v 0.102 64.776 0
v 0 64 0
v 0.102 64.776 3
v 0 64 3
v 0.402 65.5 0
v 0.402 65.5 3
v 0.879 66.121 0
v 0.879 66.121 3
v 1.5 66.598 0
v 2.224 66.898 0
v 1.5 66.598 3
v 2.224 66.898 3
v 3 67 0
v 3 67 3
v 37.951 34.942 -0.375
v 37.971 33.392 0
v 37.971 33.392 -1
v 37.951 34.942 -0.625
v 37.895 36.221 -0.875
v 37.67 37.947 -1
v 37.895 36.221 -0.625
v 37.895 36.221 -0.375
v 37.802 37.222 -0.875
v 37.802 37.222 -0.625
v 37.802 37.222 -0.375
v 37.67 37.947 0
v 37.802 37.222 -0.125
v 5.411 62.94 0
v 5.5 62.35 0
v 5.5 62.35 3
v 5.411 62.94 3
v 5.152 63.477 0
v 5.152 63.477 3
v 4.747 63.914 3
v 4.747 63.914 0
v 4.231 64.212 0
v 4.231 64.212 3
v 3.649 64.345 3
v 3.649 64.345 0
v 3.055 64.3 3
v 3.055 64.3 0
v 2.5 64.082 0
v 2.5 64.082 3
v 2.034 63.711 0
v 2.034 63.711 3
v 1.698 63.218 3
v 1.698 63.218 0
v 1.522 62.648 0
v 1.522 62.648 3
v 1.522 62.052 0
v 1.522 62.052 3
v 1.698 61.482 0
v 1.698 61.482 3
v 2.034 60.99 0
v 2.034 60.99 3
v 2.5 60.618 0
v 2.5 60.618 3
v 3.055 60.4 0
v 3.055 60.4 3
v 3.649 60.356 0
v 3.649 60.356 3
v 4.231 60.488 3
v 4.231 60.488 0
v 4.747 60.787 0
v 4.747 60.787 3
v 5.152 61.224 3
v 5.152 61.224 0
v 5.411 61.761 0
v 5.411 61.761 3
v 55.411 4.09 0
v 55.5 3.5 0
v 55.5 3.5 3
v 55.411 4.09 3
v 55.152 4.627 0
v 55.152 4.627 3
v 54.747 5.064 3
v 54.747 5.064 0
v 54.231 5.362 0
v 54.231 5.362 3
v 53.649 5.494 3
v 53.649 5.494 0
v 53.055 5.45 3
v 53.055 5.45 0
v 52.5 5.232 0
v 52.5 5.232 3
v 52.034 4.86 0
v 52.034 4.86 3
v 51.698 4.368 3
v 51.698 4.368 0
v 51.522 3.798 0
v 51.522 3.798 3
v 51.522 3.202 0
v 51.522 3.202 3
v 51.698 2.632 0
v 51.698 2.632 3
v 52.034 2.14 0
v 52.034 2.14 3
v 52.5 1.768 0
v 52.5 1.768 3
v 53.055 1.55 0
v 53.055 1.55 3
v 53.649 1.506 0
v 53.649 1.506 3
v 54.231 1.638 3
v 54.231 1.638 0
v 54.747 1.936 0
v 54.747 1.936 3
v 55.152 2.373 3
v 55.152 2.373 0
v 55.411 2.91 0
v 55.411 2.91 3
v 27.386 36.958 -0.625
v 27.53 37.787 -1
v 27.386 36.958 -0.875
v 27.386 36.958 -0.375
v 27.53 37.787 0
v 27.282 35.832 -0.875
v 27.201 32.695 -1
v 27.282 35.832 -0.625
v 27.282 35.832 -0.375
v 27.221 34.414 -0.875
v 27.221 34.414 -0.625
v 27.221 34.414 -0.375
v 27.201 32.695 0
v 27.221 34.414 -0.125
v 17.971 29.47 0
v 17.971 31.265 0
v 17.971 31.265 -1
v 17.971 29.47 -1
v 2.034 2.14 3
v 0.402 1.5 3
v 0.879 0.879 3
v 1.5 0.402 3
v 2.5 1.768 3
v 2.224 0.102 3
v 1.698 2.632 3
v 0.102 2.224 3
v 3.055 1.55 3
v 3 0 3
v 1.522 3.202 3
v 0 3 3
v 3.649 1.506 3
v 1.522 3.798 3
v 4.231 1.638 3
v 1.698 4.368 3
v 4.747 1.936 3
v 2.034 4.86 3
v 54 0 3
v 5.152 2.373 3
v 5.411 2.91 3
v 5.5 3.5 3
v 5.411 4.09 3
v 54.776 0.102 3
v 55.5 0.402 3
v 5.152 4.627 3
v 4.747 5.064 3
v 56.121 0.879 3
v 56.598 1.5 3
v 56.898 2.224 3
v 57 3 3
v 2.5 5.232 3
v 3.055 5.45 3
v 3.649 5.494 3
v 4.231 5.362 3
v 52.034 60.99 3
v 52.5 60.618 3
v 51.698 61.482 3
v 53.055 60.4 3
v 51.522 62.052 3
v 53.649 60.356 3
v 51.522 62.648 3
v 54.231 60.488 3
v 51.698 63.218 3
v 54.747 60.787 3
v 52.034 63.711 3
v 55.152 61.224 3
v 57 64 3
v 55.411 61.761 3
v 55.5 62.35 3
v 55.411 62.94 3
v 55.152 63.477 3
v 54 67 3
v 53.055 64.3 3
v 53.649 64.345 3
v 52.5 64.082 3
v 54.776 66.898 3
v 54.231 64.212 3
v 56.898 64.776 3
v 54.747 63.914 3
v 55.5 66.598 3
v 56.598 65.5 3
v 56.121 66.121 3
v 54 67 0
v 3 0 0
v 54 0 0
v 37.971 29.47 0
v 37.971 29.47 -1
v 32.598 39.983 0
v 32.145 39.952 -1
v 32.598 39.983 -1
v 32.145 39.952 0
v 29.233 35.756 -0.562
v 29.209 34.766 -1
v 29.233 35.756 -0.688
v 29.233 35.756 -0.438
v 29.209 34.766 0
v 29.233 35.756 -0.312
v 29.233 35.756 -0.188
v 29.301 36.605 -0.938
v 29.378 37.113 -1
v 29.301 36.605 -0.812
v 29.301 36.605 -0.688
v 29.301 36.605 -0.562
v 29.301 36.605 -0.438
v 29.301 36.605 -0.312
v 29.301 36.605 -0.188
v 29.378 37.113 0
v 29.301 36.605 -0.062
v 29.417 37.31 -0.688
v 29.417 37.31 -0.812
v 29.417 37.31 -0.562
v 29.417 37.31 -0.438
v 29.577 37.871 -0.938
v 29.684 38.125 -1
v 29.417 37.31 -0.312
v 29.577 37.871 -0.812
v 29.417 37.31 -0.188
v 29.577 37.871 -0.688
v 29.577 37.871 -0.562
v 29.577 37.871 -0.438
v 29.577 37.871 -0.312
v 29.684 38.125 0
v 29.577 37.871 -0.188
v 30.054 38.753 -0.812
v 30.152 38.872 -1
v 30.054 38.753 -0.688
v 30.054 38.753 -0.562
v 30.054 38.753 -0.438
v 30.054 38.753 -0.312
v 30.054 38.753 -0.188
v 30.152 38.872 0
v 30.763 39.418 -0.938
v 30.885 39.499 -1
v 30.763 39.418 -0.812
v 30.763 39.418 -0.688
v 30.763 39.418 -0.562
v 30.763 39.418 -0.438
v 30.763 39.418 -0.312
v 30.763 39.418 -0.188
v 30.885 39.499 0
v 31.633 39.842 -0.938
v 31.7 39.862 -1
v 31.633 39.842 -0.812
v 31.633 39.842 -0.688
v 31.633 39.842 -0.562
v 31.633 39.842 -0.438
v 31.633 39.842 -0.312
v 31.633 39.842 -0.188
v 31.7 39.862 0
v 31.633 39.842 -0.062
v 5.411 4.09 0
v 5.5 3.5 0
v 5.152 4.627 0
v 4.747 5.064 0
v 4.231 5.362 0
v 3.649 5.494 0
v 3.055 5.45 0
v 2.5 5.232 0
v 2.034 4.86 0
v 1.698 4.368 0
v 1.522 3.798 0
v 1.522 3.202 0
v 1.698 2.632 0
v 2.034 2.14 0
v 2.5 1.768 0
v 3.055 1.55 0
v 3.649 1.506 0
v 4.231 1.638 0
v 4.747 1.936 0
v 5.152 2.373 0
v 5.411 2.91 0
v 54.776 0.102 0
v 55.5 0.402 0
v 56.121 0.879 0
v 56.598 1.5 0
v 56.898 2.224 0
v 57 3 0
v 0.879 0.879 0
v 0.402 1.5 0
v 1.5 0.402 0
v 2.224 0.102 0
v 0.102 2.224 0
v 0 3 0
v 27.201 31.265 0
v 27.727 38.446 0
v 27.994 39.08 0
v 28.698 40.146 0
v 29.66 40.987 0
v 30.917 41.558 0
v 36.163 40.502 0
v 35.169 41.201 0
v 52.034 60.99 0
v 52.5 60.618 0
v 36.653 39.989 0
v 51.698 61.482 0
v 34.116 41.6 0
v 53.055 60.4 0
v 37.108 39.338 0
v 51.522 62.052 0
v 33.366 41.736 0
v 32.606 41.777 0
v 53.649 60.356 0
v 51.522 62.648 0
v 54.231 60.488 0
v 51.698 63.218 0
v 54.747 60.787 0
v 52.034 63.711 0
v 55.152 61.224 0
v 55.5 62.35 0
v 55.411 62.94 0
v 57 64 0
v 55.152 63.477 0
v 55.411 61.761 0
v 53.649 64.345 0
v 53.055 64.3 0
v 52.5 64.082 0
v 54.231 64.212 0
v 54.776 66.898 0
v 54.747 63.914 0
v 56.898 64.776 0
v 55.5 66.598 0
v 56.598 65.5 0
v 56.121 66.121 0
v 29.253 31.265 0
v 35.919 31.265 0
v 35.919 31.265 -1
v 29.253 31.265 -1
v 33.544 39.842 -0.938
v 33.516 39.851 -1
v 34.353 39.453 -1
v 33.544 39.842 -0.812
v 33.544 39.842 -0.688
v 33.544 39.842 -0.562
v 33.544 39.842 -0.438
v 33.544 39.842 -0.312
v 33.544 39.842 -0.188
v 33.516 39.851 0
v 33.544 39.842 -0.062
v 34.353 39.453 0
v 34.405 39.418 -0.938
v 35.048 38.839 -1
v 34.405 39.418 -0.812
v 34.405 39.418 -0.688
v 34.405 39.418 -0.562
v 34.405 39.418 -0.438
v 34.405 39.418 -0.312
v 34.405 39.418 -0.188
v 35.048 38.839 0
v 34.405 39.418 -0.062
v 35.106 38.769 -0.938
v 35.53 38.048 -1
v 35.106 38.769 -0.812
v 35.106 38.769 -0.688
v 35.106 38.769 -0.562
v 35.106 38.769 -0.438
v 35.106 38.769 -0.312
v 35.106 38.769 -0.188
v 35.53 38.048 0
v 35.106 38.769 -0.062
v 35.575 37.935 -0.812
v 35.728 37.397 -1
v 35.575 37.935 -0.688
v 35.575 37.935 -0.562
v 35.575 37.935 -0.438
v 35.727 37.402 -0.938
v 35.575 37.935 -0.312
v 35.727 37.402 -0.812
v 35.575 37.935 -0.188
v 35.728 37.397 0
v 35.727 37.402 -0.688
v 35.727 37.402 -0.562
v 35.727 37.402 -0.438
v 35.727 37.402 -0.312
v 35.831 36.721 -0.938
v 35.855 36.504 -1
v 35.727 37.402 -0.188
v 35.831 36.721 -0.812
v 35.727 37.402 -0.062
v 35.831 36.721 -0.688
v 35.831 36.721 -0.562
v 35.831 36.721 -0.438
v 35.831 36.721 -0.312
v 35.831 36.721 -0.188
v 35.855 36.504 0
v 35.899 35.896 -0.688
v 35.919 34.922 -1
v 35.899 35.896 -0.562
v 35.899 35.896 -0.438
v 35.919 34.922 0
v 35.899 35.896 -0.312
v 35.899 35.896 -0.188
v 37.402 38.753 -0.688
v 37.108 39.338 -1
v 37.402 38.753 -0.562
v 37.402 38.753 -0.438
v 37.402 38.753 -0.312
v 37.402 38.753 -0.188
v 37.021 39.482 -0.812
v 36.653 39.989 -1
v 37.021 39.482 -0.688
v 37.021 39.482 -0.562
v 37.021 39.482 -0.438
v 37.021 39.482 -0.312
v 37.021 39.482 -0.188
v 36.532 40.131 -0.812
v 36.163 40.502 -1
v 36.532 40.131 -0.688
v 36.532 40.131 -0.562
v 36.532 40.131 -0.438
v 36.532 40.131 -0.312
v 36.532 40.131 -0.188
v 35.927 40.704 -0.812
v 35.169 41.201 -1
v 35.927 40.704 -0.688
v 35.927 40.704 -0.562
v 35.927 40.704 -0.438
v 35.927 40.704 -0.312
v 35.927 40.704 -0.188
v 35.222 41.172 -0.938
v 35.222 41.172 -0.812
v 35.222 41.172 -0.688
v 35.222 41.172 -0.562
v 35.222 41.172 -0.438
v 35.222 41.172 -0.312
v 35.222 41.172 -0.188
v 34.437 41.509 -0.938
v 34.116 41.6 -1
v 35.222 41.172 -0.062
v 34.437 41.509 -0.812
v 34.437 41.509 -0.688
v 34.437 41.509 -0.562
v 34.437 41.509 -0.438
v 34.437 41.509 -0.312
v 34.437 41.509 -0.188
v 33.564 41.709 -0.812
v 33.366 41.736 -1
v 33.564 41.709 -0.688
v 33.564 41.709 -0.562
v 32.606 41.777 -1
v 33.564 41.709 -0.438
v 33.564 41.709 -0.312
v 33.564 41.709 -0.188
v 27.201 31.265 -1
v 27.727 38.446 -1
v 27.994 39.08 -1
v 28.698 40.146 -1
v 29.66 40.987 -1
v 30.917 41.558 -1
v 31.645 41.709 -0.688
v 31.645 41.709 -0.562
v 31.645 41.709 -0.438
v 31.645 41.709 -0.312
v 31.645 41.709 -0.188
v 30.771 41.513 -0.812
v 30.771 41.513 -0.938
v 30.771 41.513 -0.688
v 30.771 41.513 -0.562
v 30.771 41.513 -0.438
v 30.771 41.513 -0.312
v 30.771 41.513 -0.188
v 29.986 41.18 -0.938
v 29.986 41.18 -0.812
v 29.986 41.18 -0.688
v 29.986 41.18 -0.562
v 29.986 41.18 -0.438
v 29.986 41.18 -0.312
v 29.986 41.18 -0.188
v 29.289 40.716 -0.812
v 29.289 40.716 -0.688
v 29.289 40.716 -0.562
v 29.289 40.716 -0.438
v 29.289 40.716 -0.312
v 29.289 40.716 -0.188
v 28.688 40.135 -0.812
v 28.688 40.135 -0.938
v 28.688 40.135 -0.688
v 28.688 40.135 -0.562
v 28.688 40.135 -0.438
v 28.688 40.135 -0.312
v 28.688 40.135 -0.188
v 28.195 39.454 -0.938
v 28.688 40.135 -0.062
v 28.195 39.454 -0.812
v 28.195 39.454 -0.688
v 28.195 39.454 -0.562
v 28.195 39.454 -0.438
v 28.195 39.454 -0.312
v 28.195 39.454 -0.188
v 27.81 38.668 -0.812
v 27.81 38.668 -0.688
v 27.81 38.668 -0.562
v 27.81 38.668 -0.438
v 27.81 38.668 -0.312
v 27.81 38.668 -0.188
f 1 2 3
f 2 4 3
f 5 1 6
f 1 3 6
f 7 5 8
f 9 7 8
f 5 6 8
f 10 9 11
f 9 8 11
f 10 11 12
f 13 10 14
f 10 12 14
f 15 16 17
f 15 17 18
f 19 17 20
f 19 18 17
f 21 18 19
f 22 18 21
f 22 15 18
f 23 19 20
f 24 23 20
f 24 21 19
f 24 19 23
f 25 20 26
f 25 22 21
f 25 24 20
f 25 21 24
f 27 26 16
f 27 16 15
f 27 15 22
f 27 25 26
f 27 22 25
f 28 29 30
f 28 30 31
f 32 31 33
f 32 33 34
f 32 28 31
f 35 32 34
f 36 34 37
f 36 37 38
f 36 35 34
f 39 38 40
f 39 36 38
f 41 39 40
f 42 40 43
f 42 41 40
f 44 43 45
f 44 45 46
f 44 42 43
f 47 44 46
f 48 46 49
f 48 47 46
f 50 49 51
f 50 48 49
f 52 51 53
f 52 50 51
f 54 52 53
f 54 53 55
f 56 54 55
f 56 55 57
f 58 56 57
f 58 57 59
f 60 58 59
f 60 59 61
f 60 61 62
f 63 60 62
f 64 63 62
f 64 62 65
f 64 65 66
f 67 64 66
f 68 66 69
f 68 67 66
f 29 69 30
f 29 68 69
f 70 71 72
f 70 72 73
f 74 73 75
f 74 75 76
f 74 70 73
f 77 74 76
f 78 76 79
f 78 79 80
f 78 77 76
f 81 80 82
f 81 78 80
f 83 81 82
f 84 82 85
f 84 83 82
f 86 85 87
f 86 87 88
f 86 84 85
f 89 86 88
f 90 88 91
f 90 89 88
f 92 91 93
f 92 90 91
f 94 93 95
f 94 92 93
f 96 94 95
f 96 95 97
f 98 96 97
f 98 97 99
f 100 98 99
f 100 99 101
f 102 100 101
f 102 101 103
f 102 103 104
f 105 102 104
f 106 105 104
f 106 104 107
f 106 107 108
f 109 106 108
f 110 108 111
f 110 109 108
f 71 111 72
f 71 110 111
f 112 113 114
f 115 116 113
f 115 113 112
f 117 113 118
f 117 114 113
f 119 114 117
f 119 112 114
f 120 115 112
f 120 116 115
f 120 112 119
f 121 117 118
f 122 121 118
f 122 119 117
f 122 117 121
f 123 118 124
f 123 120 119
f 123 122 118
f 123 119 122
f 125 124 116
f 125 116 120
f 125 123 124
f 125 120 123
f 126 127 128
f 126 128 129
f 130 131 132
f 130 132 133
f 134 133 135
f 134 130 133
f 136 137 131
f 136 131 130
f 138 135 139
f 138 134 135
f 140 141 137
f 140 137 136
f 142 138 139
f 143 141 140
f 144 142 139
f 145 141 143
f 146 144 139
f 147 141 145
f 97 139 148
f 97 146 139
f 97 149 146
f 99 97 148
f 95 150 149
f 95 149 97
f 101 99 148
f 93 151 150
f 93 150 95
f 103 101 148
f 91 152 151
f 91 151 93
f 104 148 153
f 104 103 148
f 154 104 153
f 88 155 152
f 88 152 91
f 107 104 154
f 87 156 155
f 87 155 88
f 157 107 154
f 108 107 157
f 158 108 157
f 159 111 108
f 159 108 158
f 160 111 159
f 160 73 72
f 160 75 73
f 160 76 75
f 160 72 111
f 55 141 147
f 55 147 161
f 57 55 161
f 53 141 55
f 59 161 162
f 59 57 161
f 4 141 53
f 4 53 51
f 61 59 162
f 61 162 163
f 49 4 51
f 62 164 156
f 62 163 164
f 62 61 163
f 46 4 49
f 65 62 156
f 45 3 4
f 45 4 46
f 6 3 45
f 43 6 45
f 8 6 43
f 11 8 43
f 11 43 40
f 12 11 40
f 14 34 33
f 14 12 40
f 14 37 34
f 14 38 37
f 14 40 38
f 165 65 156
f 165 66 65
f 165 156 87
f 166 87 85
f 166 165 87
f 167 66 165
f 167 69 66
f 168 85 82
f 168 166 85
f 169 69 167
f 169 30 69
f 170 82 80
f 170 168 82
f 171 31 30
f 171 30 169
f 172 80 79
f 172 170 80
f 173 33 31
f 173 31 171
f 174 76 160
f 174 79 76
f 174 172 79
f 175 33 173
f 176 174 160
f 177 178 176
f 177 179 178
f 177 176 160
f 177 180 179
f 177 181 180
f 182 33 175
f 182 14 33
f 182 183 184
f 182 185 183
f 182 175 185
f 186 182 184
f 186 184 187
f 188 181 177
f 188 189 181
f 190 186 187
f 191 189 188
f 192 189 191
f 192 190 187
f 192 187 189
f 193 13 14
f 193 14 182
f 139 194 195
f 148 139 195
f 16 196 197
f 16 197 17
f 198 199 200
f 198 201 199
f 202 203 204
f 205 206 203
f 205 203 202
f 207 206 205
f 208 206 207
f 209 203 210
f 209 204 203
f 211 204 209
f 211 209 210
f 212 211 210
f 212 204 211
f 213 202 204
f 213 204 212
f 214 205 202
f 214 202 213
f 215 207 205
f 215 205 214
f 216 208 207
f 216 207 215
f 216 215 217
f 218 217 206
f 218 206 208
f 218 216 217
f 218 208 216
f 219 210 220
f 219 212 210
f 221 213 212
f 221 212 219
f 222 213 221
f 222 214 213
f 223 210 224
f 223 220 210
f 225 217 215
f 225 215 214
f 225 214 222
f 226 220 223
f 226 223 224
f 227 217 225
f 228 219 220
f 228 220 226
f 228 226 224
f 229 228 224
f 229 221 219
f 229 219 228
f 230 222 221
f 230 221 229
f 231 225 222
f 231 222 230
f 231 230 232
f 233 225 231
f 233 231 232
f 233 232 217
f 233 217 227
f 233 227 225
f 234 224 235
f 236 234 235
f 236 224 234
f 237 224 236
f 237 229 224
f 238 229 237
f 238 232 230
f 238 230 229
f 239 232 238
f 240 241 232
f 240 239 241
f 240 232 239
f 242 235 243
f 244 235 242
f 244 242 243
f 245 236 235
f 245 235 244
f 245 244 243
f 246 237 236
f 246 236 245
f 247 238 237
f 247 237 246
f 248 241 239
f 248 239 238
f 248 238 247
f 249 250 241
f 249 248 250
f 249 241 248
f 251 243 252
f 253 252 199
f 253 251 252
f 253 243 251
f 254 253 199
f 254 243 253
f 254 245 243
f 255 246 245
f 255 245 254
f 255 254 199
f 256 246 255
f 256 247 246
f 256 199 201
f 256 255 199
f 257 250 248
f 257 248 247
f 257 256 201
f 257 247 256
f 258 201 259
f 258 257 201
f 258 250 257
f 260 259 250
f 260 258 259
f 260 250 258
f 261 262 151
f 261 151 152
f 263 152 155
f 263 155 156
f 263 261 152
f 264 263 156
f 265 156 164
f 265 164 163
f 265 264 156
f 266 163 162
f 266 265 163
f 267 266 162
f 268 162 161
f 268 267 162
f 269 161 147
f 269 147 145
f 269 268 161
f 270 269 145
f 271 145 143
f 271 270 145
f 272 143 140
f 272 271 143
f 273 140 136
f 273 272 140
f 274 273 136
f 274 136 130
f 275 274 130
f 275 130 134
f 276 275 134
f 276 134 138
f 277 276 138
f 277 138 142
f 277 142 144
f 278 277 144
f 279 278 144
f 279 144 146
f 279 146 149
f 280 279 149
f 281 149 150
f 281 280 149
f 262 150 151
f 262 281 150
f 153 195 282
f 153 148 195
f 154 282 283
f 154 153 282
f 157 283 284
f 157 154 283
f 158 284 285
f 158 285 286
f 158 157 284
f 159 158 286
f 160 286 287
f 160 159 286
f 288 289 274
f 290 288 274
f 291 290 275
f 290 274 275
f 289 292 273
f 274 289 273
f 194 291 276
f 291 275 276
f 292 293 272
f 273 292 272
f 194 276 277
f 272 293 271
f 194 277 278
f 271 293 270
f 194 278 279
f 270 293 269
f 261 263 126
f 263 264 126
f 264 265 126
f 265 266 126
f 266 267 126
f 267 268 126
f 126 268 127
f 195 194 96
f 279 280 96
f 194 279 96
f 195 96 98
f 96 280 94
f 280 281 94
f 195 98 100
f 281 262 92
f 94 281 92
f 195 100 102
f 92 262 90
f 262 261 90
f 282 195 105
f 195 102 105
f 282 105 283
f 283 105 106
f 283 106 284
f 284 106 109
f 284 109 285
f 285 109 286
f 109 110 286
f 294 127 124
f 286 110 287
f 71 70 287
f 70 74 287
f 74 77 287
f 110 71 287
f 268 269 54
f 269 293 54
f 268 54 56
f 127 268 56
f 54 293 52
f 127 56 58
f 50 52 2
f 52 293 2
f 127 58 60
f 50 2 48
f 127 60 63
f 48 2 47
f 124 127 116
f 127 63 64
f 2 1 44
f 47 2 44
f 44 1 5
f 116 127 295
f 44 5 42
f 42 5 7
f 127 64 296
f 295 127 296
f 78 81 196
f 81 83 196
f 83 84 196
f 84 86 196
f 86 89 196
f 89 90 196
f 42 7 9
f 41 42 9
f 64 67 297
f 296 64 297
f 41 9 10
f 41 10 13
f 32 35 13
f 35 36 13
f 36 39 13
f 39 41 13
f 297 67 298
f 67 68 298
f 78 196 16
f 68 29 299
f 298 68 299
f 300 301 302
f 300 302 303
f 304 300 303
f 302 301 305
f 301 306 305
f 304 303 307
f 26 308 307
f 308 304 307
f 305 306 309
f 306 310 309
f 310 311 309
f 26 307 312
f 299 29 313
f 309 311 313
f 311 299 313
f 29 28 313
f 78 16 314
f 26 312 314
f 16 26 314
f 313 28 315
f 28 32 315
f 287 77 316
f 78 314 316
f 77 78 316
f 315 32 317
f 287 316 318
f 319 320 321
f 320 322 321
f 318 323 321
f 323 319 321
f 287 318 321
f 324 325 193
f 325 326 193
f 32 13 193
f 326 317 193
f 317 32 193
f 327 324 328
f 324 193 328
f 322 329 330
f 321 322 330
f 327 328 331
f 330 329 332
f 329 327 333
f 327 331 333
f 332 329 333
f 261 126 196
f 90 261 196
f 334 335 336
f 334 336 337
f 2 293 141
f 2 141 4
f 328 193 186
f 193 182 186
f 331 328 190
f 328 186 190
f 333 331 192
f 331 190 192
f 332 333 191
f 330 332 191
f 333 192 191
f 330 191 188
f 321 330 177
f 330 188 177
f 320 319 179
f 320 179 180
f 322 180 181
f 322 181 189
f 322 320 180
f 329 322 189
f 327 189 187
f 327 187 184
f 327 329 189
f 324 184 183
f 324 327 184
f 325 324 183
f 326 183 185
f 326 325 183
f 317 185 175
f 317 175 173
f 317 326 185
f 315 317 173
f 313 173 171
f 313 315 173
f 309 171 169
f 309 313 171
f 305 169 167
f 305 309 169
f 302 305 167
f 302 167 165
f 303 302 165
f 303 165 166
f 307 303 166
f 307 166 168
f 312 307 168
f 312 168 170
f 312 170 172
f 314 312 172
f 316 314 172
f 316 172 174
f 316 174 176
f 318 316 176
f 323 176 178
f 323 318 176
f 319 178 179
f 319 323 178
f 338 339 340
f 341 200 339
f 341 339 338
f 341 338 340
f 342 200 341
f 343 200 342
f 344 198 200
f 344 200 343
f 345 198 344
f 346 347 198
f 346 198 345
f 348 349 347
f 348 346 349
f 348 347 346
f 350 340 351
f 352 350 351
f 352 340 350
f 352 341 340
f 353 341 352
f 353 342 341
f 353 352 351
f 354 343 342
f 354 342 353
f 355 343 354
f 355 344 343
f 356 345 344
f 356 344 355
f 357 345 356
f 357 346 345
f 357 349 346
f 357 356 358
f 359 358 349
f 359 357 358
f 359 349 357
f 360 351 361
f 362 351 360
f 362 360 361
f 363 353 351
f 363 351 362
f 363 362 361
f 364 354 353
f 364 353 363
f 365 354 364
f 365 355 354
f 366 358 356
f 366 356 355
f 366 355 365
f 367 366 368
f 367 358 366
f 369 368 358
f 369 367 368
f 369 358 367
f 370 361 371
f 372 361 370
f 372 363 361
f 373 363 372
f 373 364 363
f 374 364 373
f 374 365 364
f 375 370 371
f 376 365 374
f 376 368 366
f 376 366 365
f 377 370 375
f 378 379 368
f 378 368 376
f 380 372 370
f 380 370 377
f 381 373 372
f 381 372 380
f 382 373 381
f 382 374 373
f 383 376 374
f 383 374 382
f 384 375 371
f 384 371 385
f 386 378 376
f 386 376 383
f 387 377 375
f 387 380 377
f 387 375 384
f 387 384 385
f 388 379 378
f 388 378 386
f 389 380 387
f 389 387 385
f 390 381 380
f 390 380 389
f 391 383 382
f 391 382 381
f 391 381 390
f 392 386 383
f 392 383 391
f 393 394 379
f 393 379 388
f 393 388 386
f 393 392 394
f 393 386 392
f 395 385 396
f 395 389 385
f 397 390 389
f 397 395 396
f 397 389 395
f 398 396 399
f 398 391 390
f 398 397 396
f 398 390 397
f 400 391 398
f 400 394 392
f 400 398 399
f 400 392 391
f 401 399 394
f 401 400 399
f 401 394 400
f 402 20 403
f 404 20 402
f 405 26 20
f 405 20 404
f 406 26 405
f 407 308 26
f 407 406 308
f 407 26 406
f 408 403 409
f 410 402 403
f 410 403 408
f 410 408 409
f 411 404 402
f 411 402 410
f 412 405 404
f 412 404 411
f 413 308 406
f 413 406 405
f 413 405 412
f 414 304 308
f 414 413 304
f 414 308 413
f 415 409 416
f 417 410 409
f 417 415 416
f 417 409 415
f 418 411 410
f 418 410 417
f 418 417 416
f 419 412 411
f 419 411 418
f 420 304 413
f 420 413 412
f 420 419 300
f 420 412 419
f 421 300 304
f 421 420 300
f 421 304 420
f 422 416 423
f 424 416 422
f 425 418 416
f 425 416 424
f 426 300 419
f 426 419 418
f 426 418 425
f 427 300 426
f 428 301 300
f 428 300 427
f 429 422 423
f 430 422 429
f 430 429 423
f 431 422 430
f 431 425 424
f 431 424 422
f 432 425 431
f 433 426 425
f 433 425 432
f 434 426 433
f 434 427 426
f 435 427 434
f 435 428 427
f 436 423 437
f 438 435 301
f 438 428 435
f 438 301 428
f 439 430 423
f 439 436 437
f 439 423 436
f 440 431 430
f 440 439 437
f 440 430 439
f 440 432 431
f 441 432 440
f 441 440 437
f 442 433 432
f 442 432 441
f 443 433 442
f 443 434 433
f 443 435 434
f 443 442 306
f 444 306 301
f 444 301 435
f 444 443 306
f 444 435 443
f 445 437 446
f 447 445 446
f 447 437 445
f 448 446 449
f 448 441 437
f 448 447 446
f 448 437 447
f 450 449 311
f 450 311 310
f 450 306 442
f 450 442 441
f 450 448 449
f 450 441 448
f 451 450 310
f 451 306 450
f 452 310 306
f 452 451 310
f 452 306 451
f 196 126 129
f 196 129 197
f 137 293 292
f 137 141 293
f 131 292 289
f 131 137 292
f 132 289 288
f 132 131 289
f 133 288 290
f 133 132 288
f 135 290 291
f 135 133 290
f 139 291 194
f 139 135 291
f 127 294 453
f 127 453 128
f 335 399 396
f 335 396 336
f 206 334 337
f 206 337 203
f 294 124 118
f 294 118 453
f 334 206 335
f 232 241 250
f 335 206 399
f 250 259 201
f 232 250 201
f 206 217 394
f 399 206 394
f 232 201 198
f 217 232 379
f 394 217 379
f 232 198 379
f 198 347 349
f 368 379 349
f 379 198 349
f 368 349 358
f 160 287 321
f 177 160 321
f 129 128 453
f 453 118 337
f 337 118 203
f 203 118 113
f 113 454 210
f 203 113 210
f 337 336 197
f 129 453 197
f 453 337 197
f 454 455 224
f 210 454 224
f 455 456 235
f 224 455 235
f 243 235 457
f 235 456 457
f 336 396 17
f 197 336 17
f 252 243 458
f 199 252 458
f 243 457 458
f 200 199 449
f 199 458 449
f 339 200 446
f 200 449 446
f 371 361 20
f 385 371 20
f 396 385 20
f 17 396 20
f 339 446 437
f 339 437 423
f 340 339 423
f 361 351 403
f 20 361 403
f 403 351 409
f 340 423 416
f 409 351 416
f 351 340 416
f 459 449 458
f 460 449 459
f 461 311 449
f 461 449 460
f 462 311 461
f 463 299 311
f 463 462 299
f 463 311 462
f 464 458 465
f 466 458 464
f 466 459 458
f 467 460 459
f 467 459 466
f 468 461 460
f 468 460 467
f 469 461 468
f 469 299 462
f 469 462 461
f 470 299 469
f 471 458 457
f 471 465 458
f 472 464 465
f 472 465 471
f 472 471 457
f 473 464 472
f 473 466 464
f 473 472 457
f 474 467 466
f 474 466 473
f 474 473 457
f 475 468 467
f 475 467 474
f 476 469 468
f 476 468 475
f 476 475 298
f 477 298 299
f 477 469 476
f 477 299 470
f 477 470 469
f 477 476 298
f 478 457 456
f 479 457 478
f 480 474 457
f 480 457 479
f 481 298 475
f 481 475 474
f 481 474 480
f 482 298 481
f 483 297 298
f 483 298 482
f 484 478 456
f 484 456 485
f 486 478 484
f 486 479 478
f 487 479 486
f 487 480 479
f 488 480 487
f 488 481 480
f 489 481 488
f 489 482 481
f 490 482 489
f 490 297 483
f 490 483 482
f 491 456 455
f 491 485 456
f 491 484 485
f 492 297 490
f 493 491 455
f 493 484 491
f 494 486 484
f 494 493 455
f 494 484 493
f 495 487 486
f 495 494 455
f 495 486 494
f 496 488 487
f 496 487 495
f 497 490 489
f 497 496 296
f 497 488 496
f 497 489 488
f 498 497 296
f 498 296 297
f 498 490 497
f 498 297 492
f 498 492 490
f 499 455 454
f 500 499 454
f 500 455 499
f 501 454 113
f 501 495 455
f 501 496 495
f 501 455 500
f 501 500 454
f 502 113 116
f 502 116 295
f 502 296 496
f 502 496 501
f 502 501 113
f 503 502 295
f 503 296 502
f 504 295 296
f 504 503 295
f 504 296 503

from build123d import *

# Parameters (mm, degrees)
SKICA1_W                = 57
SKICA1_H                = 67
SKICA1_R                = 2
P_IDAT_VYSUNUT_M1_DEPTH = 3
P_IDAT_VYSUNUT_M2_DEPTH = 1
ZAOBLIT1_R              = 3


with BuildPart() as part:
    # Skica1 → Přidat vysunutím1 (new body)
    with BuildSketch(Plane.XY):
        with Locations((28.5, 33.5)):
            Rectangle(SKICA1_W, SKICA1_H)
        with Locations((3.5, 62.35016579)):
            Circle(SKICA1_R, mode=Mode.SUBTRACT)
        with Locations((53.5, 62.35016579)):
            Circle(SKICA1_R, mode=Mode.SUBTRACT)
        with Locations((53.5, 3.5)):
            Circle(SKICA1_R, mode=Mode.SUBTRACT)
        with Locations((3.5, 3.5)):
            Circle(SKICA1_R, mode=Mode.SUBTRACT)
    extrude(amount=P_IDAT_VYSUNUT_M1_DEPTH)

    # Skica2 → Přidat vysunutím2 (add)
    with BuildSketch(Plane(origin=(0, 0, 0), x_dir=(-1, 0, 0), z_dir=(0, 0, -1))):
        with BuildLine():
            Line((-37.970657991, 29.469714485), (-37.970657991, 33.391990126))
            add(Edge.make_bspline(
                [(-37.970657991, 33.391990126), (-37.970361441, 33.661766733), (-37.969793238, 34.178670691), (-37.952566119, 34.919899581), (-37.92955645, 35.593098048), (-37.897659918, 36.19681451), (-37.859965116, 36.732906499), (-37.80709632, 37.198948211), (-37.751894631, 37.598602818), (-37.695772308, 37.838068244), (-37.670177222, 37.947278587)],
                knots=[0, 0, 0, 0, 1.415646017, 2.712440637, 3.8905458, 4.950247383, 5.884950622, 6.709939814, 7.411656543, 8, 8, 8, 8], degree=3))
            add(Edge.make_bspline(
                [(-37.670177222, 37.947278587), (-37.632336028, 38.085526146), (-37.557545321, 38.358763633), (-37.407774038, 38.752501326), (-37.230082137, 39.12702996), (-37.027953627, 39.484021162), (-36.791438809, 39.8169729), (-36.53627201, 40.136984307), (-36.245963268, 40.432759), (-35.929669008, 40.708303209), (-35.591400822, 40.962981078), (-35.22501281, 41.176956538), (-34.841443644, 41.364050016), (-34.435480303, 41.51723294), (-34.006728651, 41.631146127), (-33.558235665, 41.715715192), (-33.089497036, 41.76963955), (-32.769150626, 41.774786619), (-32.606074658, 41.777406793)],
                knots=[0, 0, 0, 0, 0.999549623, 1.97554611, 2.93413192, 3.889860808, 4.833293765, 5.780583482, 6.742559327, 7.719844669, 8.705620613, 9.691528643, 10.674968152, 11.680406189, 12.713313868, 13.765869198, 14.862690416, 16, 16, 16, 16], degree=3))
            add(Edge.make_bspline(
                [(-32.606074658, 41.777406793), (-32.441630219, 41.774998651), (-32.119883568, 41.77028696), (-31.649181921, 41.713736758), (-31.199362549, 41.637564235), (-30.771422832, 41.520438221), (-30.367904143, 41.367034375), (-29.982639961, 41.187079788), (-29.622184693, 40.970031043), (-29.285229735, 40.720632016), (-28.971458808, 40.443194333), (-28.683145696, 40.13889183), (-28.421978048, 39.808953015), (-28.18737037, 39.454426455), (-27.984763059, 39.07185589), (-27.803292745, 38.667043584), (-27.650886684, 38.236470919), (-27.570714904, 37.938513696), (-27.529952863, 37.787022177)],
                knots=[0, 0, 0, 0, 1.121902311, 2.195077645, 3.232258892, 4.234102512, 5.217864754, 6.176164875, 7.132989551, 8.084763148, 9.034132444, 9.988522005, 10.94243251, 11.903244335, 12.886203696, 13.894208494, 14.929344452, 16, 16, 16, 16], degree=3))
            add(Edge.make_bspline(
                [(-27.529952863, 37.787022177), (-27.503327115, 37.661721699), (-27.44497524, 37.387118416), (-27.379389367, 36.934902646), (-27.325601784, 36.408121947), (-27.275406782, 35.808568661), (-27.248809706, 35.134844643), (-27.2175804, 34.388495093), (-27.202844998, 33.566994114), (-27.201913537, 32.994022793), (-27.201427222, 32.694874741)],
                knots=[0, 0, 0, 0, 0.601372724, 1.317943291, 2.144091499, 3.08771165, 4.142394186, 5.309582461, 6.595334295, 8, 8, 8, 8], degree=3))
            Line((-27.201427222, 32.694874741), (-27.201427222, 31.26458628))
            Line((-27.201427222, 31.26458628), (-17.970657991, 31.26458628))
            Line((-17.970657991, 31.26458628), (-17.970657991, 29.469714485))
            Line((-17.970657991, 29.469714485), (-37.970657991, 29.469714485))
        make_face()
        with BuildLine():
            Line((-35.91937594, 31.26458628), (-29.252709273, 31.26458628))
            Line((-29.252709273, 31.26458628), (-29.20863876, 34.766188844))
            add(Edge.make_bspline(
                [(-29.20863876, 34.766188844), (-29.208544615, 34.937161044), (-29.208362868, 35.267219352), (-29.231212915, 35.74398178), (-29.257239208, 36.186374829), (-29.296602466, 36.592734917), (-29.348201463, 36.964487883), (-29.412369977, 37.298422688), (-29.482131358, 37.599533869), (-29.59868532, 37.945903952), (-29.777898997, 38.335235337), (-30.038784485, 38.760550157), (-30.376749174, 39.118208289), (-30.755679044, 39.427140639), (-31.176087647, 39.677123759), (-31.628265809, 39.853476877), (-32.105514558, 39.962067848), (-32.431886932, 39.97562982), (-32.598061837, 39.982534998)],
                knots=[0, 0, 0, 0, 1.160746174, 2.240796558, 3.240300023, 4.169675897, 5.012224395, 5.787635701, 6.478238024, 7.109103438, 8.265591281, 9.382545711, 10.479929969, 11.588830844, 12.694575677, 13.785760505, 14.872603606, 16, 16, 16, 16], degree=3))
            add(Edge.make_bspline(
                [(-32.598061837, 39.982534998), (-32.758853186, 39.975319803), (-33.078486486, 39.96097689), (-33.546938864, 39.854373012), (-33.99399119, 39.675230054), (-34.411014182, 39.42692209), (-34.789110253, 39.125487049), (-35.118120247, 38.775412024), (-35.380842639, 38.375801415), (-35.556946227, 38.007170082), (-35.66004866, 37.677065259), (-35.734515791, 37.39175206), (-35.785866012, 37.067954947), (-35.835001767, 36.708750483), (-35.874664128, 36.314594731), (-35.902207185, 35.882982532), (-35.918157543, 35.415351195), (-35.918959975, 35.090720886), (-35.91937594, 34.922438844)],
                knots=[0, 0, 0, 0, 1.120540835, 2.227496496, 3.330685923, 4.466139262, 5.598993257, 6.692710361, 7.80064471, 8.921224235, 9.527843361, 10.209888745, 10.975318552, 11.811557897, 12.738105936, 13.73658638, 14.826690375, 16, 16, 16, 16], degree=3))
            Line((-35.91937594, 34.922438844), (-35.91937594, 31.26458628))
        make_face(mode=Mode.SUBTRACT)
    extrude(amount=P_IDAT_VYSUNUT_M2_DEPTH)

    # Zaoblit1
    zaoblit1_edges = [part.edges().sort_by_distance(p)[0] for p in [
        (0, 67, 1.5),
        (57, 67, 1.5),
        (57, 0, 1.5),
        (0, 0, 1.5),
    ]]
    fillet(zaoblit1_edges, radius=ZAOBLIT1_R)


solid = part.part
